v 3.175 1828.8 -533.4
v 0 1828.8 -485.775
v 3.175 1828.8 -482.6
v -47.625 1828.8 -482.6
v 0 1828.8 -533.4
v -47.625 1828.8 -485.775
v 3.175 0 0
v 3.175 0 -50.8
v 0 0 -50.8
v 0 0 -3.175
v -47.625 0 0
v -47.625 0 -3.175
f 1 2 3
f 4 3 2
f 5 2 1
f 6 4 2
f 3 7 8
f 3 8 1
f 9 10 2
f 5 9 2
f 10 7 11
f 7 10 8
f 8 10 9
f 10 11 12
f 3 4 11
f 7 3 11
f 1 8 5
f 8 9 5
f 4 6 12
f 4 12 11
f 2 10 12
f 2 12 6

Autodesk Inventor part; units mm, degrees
ref_plane "YZ Plane" through (0, 0, 0) normal (1, 0, 0) x (0, 1, 0)
ref_plane "XZ Plane" through (0, 0, 0) normal (0, 1, 0) x (-1, 0, 0)
ref_plane "XY Plane" through (0, 0, 0) normal (0, 0, 1) x (1, 0, 0)
sketch "Sketch1" plane through (0, 0, 0) normal (1, 0, 0) x (0, 1, 0)
  line L0 (1828.8, -482.6) -> (0, 0)
  line L1 (1828.8, -482.6) -> (1828.8, -533.4)
  line L2 (0, 0) -> (0, -50.8)
  line L3 (0, -50.8) -> (1828.8, -533.4)
  dimension "d3" = 50.8
  dimension "d4" = 50.8
extrude "Extrusion1" add sketch "Sketch1" along normal blind 3.175
sketch "Sketch2" plane through (0, 0, 0) normal (-1, 0, 0) x (0, 0, 1)
  line L0 (0, 0) -> (-482.6, 1828.8)
  line L1 (-482.6, 1828.8) -> (0, 0) projected
  line L2 (-482.6, 1828.8) -> (-485.775, 1828.8)
  line L3 (-533.4, 1828.8) -> (-482.6, 1828.8) projected
  line L4 (0, 0) -> (-3.175, 0)
  line L5 (0, 0) -> (-50.8, 0) projected
  line L6 (-50.8, 0) -> (-533.4, 1828.8) projected
  line L7 (-3.175, 0) -> (-485.775, 1828.8)
  dimension "d7" = 3.175
  dimension "d8" = 3.175
extrude "Extrusion2" add sketch "Sketch2" along normal blind 47.625 contours L4 L7 L2 L0
properties part number "Front Left Beam"
